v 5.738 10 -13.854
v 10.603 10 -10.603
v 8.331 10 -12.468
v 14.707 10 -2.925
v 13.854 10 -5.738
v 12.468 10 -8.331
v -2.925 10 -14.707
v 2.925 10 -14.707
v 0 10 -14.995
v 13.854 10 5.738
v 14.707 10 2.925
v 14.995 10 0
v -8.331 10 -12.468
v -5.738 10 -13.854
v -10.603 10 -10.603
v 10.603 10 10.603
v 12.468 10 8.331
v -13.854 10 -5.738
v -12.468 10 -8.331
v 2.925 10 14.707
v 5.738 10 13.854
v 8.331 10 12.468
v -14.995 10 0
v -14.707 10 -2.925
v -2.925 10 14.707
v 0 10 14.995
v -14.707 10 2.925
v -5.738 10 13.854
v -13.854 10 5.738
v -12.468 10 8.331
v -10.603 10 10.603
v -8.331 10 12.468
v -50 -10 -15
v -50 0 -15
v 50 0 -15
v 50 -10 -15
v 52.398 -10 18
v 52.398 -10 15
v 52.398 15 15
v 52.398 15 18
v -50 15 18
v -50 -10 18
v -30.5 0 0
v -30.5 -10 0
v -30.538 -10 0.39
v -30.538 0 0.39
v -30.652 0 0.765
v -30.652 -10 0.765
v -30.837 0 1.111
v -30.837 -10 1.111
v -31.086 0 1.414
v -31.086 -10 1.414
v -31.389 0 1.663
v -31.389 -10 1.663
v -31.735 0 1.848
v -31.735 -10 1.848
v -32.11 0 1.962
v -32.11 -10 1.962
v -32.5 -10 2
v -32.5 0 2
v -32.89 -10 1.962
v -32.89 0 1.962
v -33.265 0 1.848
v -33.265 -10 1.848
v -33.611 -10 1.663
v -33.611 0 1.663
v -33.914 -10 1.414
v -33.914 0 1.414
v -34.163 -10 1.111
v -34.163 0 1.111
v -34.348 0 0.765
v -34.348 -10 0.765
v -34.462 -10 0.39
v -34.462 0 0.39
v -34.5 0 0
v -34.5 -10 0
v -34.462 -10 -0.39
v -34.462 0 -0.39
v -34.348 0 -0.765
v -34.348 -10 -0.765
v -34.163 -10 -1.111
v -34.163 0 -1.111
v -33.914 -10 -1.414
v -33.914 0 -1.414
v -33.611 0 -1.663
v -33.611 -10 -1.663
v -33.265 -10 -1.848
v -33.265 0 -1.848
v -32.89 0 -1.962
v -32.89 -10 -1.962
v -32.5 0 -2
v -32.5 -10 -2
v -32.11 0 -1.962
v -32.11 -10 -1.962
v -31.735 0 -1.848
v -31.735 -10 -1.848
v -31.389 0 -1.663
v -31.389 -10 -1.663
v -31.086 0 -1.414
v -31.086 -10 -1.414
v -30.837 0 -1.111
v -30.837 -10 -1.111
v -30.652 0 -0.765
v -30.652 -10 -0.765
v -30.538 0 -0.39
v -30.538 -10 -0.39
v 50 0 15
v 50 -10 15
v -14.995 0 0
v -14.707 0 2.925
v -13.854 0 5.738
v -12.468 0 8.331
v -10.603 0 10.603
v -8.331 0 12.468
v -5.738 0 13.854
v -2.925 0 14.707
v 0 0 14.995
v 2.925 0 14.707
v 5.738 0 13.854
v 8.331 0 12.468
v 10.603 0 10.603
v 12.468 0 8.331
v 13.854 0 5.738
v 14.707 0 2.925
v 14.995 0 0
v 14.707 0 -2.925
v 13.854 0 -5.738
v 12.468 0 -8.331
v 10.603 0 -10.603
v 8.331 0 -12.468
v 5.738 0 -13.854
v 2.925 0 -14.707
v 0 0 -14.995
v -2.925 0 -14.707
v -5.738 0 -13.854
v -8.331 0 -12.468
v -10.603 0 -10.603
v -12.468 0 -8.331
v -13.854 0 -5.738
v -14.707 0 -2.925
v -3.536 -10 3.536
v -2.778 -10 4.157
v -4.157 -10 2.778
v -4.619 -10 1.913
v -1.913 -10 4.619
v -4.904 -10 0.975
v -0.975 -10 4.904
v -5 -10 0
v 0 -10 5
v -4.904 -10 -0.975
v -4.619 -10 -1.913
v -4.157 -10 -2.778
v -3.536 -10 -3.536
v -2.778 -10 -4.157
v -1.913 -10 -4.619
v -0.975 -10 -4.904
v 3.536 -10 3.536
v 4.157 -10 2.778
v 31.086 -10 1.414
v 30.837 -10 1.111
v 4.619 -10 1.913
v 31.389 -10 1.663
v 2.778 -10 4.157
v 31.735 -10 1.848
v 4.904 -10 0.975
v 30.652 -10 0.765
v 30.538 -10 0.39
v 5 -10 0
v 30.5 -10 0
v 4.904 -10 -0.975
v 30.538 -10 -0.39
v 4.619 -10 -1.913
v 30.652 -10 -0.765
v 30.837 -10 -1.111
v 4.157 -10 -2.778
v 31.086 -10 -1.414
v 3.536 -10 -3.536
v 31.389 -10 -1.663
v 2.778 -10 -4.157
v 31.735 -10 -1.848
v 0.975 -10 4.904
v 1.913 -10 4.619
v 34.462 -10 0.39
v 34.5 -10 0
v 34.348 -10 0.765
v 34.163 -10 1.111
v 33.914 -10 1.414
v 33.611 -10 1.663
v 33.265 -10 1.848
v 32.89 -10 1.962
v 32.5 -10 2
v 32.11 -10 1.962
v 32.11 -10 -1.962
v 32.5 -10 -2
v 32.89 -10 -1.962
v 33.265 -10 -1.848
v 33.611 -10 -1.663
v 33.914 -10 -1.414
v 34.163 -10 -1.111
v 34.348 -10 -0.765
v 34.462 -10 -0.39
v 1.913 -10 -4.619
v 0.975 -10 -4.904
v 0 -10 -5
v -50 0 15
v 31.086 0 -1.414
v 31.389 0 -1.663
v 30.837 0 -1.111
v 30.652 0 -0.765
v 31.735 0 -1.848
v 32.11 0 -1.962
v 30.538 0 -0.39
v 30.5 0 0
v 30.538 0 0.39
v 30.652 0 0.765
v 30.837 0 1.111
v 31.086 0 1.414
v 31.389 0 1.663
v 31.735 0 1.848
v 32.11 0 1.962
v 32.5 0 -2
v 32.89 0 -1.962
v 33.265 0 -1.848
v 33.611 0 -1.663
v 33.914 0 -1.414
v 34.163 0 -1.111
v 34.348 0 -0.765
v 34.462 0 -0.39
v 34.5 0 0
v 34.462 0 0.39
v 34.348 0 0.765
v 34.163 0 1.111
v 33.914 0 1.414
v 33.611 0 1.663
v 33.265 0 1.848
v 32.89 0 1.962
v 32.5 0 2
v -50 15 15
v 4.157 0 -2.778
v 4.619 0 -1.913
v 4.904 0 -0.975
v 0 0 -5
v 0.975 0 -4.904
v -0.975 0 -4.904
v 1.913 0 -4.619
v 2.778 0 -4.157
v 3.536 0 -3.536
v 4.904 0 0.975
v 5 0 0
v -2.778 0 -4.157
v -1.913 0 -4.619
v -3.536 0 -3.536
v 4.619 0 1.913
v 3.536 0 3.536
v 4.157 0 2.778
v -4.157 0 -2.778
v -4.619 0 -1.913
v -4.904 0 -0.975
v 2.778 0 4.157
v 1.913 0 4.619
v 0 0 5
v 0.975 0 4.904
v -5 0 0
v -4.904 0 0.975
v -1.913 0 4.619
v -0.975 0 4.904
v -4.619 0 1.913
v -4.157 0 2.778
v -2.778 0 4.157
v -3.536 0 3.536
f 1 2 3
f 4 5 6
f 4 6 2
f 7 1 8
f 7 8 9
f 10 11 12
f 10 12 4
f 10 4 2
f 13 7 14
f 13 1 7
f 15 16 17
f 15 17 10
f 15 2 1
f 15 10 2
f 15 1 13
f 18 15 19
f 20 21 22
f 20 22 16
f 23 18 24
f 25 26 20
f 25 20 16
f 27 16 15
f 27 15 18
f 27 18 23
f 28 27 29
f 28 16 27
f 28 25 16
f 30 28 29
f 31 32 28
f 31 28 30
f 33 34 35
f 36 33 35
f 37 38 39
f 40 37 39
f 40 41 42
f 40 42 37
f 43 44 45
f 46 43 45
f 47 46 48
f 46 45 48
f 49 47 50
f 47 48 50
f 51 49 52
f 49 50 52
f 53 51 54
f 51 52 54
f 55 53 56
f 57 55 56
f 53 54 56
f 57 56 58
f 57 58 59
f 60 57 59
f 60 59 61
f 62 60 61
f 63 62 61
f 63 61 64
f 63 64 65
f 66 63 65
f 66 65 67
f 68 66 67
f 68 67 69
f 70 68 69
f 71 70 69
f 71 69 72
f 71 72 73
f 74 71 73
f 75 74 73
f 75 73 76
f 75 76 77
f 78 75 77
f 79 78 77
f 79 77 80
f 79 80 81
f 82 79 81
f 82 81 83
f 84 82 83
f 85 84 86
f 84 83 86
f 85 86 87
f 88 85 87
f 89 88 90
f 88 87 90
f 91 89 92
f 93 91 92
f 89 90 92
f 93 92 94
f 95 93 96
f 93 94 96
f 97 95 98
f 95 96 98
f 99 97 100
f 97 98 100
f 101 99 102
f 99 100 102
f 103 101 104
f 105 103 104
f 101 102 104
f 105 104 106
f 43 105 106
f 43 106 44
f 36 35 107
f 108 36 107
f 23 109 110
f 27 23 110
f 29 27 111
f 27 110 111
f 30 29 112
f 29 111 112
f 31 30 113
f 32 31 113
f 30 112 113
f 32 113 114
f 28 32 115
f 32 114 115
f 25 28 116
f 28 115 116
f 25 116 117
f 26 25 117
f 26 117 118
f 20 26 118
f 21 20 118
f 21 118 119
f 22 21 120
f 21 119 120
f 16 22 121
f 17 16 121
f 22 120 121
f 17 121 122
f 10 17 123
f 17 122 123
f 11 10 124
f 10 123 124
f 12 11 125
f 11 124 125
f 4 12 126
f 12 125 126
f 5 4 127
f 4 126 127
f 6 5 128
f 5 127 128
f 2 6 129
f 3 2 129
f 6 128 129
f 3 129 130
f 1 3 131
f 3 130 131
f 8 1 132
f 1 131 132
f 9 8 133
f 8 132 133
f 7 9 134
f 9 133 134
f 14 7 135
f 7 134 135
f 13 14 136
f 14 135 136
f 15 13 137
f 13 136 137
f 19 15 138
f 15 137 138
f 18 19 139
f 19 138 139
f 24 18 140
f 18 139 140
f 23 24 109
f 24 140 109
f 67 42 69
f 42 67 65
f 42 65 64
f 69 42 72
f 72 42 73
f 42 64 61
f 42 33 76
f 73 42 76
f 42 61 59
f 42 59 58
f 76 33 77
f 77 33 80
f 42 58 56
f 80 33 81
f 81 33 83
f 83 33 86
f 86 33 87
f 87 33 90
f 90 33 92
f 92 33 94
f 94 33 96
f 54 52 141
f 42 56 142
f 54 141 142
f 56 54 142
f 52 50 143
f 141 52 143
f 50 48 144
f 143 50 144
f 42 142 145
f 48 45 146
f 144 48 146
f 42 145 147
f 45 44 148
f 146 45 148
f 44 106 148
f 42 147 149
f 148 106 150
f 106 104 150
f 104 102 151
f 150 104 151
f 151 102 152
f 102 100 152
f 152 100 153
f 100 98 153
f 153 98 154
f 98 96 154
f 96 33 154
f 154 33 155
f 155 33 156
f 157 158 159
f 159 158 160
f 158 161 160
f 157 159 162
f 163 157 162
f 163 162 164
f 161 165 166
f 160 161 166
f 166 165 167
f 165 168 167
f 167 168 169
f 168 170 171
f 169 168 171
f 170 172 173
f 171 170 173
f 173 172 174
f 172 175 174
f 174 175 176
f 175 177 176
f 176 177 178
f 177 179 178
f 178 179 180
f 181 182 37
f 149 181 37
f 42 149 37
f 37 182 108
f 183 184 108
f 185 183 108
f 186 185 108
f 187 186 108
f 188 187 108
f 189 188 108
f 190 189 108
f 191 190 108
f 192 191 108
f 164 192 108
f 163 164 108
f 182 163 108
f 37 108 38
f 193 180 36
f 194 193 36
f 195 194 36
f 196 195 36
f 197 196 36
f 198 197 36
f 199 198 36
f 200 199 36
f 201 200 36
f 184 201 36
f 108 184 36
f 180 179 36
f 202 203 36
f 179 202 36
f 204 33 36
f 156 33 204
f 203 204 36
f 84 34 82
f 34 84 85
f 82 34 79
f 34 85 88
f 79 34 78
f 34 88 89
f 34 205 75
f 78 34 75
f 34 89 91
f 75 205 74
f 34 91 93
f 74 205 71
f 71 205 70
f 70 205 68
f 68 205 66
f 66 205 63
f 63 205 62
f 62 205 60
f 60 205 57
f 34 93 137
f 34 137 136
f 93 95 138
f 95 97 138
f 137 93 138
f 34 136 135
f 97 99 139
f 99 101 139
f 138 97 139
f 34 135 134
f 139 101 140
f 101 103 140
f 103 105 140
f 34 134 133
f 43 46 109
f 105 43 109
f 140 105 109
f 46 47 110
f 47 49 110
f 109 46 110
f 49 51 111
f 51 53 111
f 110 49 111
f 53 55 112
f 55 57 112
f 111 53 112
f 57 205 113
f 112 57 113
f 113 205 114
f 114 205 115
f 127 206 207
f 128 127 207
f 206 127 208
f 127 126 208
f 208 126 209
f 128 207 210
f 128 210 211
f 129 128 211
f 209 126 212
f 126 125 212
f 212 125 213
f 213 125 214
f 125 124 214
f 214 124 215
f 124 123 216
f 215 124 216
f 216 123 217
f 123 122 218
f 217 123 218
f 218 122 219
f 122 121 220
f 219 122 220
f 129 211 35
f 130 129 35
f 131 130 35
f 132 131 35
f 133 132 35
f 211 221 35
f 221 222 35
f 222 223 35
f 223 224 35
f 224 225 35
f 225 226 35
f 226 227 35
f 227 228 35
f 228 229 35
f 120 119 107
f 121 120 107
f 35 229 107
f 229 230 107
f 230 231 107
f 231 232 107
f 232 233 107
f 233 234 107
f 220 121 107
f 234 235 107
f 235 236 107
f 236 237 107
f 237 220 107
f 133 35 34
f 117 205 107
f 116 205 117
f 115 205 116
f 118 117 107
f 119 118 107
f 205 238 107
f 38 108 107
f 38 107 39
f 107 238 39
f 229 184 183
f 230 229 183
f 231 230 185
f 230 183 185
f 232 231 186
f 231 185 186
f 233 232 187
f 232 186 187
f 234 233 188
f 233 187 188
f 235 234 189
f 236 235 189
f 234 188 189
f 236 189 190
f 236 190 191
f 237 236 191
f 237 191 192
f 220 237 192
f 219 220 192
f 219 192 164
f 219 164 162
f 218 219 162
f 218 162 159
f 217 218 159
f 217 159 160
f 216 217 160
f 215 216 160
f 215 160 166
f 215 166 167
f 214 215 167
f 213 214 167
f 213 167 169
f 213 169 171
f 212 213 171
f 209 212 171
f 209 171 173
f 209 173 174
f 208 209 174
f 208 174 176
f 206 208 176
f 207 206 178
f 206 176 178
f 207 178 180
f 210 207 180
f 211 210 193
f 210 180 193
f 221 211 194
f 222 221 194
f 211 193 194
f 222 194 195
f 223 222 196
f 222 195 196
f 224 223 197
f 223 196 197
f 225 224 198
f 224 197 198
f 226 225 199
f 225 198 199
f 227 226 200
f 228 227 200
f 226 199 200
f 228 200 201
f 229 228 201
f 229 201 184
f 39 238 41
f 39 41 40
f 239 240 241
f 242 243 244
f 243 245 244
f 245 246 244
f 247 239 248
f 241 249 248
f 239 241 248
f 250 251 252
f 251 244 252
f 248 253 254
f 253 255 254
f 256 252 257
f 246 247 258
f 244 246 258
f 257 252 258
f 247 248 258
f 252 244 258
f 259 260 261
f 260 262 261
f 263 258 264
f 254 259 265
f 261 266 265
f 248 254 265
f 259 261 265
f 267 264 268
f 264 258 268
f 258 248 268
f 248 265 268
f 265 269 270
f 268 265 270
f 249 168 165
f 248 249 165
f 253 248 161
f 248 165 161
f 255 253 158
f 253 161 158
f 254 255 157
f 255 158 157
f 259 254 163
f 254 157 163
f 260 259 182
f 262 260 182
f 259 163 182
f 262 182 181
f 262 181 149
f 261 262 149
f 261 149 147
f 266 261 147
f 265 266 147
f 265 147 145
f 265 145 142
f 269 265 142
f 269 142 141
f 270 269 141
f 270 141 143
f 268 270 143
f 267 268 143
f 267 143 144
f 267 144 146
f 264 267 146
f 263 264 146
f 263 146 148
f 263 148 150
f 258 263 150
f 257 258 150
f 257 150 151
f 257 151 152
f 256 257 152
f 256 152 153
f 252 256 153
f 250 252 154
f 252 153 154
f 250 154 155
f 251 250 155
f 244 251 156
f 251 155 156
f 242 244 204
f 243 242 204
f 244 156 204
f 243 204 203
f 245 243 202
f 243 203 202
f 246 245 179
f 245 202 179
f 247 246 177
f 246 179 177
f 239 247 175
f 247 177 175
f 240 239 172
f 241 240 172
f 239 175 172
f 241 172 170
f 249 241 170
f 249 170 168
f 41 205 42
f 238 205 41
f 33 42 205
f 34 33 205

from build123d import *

# Parameters (mm, degrees)
F0_W     = 100
F0_H     = 30
F1_DEPTH = 10
F2_R     = 2
F2_R_2   = 5
F3_DEPTH = 25
F4_W     = 102.398372
F4_H     = 25
F5_DEPTH = 3
F6_R     = 14.995
F7_DEPTH = 10


with BuildPart() as f1:
    # F0 (on Front) → F1 (new body)
    with BuildSketch(Plane.XZ):
        Rectangle(F0_W, F0_H)
    extrude(amount=F1_DEPTH)

    # F2 (on face) → F3 (cut)
    with BuildSketch(Plane.XZ.offset(10)):
        with Locations((-32.5, 0)):
            Circle(F2_R)
        with Locations((32.5, 0)):
            Circle(F2_R)
        Circle(F2_R_2)
    extrude(amount=-F3_DEPTH, mode=Mode.SUBTRACT)

    # F4 (on face) → F5 (join)
    with BuildSketch(Plane.XY.offset(15)):
        with Locations((1.199186, 2.5)):
            Rectangle(F4_W, F4_H)
    extrude(amount=F5_DEPTH)

    # F6 (on face) → F7 (join)
    with BuildSketch(Plane(origin=(0, 0, 0), x_dir=(-1, 0, 0), z_dir=(0, 1, 0))):
        Circle(F6_R)
    extrude(amount=F7_DEPTH)


solid = f1.part
